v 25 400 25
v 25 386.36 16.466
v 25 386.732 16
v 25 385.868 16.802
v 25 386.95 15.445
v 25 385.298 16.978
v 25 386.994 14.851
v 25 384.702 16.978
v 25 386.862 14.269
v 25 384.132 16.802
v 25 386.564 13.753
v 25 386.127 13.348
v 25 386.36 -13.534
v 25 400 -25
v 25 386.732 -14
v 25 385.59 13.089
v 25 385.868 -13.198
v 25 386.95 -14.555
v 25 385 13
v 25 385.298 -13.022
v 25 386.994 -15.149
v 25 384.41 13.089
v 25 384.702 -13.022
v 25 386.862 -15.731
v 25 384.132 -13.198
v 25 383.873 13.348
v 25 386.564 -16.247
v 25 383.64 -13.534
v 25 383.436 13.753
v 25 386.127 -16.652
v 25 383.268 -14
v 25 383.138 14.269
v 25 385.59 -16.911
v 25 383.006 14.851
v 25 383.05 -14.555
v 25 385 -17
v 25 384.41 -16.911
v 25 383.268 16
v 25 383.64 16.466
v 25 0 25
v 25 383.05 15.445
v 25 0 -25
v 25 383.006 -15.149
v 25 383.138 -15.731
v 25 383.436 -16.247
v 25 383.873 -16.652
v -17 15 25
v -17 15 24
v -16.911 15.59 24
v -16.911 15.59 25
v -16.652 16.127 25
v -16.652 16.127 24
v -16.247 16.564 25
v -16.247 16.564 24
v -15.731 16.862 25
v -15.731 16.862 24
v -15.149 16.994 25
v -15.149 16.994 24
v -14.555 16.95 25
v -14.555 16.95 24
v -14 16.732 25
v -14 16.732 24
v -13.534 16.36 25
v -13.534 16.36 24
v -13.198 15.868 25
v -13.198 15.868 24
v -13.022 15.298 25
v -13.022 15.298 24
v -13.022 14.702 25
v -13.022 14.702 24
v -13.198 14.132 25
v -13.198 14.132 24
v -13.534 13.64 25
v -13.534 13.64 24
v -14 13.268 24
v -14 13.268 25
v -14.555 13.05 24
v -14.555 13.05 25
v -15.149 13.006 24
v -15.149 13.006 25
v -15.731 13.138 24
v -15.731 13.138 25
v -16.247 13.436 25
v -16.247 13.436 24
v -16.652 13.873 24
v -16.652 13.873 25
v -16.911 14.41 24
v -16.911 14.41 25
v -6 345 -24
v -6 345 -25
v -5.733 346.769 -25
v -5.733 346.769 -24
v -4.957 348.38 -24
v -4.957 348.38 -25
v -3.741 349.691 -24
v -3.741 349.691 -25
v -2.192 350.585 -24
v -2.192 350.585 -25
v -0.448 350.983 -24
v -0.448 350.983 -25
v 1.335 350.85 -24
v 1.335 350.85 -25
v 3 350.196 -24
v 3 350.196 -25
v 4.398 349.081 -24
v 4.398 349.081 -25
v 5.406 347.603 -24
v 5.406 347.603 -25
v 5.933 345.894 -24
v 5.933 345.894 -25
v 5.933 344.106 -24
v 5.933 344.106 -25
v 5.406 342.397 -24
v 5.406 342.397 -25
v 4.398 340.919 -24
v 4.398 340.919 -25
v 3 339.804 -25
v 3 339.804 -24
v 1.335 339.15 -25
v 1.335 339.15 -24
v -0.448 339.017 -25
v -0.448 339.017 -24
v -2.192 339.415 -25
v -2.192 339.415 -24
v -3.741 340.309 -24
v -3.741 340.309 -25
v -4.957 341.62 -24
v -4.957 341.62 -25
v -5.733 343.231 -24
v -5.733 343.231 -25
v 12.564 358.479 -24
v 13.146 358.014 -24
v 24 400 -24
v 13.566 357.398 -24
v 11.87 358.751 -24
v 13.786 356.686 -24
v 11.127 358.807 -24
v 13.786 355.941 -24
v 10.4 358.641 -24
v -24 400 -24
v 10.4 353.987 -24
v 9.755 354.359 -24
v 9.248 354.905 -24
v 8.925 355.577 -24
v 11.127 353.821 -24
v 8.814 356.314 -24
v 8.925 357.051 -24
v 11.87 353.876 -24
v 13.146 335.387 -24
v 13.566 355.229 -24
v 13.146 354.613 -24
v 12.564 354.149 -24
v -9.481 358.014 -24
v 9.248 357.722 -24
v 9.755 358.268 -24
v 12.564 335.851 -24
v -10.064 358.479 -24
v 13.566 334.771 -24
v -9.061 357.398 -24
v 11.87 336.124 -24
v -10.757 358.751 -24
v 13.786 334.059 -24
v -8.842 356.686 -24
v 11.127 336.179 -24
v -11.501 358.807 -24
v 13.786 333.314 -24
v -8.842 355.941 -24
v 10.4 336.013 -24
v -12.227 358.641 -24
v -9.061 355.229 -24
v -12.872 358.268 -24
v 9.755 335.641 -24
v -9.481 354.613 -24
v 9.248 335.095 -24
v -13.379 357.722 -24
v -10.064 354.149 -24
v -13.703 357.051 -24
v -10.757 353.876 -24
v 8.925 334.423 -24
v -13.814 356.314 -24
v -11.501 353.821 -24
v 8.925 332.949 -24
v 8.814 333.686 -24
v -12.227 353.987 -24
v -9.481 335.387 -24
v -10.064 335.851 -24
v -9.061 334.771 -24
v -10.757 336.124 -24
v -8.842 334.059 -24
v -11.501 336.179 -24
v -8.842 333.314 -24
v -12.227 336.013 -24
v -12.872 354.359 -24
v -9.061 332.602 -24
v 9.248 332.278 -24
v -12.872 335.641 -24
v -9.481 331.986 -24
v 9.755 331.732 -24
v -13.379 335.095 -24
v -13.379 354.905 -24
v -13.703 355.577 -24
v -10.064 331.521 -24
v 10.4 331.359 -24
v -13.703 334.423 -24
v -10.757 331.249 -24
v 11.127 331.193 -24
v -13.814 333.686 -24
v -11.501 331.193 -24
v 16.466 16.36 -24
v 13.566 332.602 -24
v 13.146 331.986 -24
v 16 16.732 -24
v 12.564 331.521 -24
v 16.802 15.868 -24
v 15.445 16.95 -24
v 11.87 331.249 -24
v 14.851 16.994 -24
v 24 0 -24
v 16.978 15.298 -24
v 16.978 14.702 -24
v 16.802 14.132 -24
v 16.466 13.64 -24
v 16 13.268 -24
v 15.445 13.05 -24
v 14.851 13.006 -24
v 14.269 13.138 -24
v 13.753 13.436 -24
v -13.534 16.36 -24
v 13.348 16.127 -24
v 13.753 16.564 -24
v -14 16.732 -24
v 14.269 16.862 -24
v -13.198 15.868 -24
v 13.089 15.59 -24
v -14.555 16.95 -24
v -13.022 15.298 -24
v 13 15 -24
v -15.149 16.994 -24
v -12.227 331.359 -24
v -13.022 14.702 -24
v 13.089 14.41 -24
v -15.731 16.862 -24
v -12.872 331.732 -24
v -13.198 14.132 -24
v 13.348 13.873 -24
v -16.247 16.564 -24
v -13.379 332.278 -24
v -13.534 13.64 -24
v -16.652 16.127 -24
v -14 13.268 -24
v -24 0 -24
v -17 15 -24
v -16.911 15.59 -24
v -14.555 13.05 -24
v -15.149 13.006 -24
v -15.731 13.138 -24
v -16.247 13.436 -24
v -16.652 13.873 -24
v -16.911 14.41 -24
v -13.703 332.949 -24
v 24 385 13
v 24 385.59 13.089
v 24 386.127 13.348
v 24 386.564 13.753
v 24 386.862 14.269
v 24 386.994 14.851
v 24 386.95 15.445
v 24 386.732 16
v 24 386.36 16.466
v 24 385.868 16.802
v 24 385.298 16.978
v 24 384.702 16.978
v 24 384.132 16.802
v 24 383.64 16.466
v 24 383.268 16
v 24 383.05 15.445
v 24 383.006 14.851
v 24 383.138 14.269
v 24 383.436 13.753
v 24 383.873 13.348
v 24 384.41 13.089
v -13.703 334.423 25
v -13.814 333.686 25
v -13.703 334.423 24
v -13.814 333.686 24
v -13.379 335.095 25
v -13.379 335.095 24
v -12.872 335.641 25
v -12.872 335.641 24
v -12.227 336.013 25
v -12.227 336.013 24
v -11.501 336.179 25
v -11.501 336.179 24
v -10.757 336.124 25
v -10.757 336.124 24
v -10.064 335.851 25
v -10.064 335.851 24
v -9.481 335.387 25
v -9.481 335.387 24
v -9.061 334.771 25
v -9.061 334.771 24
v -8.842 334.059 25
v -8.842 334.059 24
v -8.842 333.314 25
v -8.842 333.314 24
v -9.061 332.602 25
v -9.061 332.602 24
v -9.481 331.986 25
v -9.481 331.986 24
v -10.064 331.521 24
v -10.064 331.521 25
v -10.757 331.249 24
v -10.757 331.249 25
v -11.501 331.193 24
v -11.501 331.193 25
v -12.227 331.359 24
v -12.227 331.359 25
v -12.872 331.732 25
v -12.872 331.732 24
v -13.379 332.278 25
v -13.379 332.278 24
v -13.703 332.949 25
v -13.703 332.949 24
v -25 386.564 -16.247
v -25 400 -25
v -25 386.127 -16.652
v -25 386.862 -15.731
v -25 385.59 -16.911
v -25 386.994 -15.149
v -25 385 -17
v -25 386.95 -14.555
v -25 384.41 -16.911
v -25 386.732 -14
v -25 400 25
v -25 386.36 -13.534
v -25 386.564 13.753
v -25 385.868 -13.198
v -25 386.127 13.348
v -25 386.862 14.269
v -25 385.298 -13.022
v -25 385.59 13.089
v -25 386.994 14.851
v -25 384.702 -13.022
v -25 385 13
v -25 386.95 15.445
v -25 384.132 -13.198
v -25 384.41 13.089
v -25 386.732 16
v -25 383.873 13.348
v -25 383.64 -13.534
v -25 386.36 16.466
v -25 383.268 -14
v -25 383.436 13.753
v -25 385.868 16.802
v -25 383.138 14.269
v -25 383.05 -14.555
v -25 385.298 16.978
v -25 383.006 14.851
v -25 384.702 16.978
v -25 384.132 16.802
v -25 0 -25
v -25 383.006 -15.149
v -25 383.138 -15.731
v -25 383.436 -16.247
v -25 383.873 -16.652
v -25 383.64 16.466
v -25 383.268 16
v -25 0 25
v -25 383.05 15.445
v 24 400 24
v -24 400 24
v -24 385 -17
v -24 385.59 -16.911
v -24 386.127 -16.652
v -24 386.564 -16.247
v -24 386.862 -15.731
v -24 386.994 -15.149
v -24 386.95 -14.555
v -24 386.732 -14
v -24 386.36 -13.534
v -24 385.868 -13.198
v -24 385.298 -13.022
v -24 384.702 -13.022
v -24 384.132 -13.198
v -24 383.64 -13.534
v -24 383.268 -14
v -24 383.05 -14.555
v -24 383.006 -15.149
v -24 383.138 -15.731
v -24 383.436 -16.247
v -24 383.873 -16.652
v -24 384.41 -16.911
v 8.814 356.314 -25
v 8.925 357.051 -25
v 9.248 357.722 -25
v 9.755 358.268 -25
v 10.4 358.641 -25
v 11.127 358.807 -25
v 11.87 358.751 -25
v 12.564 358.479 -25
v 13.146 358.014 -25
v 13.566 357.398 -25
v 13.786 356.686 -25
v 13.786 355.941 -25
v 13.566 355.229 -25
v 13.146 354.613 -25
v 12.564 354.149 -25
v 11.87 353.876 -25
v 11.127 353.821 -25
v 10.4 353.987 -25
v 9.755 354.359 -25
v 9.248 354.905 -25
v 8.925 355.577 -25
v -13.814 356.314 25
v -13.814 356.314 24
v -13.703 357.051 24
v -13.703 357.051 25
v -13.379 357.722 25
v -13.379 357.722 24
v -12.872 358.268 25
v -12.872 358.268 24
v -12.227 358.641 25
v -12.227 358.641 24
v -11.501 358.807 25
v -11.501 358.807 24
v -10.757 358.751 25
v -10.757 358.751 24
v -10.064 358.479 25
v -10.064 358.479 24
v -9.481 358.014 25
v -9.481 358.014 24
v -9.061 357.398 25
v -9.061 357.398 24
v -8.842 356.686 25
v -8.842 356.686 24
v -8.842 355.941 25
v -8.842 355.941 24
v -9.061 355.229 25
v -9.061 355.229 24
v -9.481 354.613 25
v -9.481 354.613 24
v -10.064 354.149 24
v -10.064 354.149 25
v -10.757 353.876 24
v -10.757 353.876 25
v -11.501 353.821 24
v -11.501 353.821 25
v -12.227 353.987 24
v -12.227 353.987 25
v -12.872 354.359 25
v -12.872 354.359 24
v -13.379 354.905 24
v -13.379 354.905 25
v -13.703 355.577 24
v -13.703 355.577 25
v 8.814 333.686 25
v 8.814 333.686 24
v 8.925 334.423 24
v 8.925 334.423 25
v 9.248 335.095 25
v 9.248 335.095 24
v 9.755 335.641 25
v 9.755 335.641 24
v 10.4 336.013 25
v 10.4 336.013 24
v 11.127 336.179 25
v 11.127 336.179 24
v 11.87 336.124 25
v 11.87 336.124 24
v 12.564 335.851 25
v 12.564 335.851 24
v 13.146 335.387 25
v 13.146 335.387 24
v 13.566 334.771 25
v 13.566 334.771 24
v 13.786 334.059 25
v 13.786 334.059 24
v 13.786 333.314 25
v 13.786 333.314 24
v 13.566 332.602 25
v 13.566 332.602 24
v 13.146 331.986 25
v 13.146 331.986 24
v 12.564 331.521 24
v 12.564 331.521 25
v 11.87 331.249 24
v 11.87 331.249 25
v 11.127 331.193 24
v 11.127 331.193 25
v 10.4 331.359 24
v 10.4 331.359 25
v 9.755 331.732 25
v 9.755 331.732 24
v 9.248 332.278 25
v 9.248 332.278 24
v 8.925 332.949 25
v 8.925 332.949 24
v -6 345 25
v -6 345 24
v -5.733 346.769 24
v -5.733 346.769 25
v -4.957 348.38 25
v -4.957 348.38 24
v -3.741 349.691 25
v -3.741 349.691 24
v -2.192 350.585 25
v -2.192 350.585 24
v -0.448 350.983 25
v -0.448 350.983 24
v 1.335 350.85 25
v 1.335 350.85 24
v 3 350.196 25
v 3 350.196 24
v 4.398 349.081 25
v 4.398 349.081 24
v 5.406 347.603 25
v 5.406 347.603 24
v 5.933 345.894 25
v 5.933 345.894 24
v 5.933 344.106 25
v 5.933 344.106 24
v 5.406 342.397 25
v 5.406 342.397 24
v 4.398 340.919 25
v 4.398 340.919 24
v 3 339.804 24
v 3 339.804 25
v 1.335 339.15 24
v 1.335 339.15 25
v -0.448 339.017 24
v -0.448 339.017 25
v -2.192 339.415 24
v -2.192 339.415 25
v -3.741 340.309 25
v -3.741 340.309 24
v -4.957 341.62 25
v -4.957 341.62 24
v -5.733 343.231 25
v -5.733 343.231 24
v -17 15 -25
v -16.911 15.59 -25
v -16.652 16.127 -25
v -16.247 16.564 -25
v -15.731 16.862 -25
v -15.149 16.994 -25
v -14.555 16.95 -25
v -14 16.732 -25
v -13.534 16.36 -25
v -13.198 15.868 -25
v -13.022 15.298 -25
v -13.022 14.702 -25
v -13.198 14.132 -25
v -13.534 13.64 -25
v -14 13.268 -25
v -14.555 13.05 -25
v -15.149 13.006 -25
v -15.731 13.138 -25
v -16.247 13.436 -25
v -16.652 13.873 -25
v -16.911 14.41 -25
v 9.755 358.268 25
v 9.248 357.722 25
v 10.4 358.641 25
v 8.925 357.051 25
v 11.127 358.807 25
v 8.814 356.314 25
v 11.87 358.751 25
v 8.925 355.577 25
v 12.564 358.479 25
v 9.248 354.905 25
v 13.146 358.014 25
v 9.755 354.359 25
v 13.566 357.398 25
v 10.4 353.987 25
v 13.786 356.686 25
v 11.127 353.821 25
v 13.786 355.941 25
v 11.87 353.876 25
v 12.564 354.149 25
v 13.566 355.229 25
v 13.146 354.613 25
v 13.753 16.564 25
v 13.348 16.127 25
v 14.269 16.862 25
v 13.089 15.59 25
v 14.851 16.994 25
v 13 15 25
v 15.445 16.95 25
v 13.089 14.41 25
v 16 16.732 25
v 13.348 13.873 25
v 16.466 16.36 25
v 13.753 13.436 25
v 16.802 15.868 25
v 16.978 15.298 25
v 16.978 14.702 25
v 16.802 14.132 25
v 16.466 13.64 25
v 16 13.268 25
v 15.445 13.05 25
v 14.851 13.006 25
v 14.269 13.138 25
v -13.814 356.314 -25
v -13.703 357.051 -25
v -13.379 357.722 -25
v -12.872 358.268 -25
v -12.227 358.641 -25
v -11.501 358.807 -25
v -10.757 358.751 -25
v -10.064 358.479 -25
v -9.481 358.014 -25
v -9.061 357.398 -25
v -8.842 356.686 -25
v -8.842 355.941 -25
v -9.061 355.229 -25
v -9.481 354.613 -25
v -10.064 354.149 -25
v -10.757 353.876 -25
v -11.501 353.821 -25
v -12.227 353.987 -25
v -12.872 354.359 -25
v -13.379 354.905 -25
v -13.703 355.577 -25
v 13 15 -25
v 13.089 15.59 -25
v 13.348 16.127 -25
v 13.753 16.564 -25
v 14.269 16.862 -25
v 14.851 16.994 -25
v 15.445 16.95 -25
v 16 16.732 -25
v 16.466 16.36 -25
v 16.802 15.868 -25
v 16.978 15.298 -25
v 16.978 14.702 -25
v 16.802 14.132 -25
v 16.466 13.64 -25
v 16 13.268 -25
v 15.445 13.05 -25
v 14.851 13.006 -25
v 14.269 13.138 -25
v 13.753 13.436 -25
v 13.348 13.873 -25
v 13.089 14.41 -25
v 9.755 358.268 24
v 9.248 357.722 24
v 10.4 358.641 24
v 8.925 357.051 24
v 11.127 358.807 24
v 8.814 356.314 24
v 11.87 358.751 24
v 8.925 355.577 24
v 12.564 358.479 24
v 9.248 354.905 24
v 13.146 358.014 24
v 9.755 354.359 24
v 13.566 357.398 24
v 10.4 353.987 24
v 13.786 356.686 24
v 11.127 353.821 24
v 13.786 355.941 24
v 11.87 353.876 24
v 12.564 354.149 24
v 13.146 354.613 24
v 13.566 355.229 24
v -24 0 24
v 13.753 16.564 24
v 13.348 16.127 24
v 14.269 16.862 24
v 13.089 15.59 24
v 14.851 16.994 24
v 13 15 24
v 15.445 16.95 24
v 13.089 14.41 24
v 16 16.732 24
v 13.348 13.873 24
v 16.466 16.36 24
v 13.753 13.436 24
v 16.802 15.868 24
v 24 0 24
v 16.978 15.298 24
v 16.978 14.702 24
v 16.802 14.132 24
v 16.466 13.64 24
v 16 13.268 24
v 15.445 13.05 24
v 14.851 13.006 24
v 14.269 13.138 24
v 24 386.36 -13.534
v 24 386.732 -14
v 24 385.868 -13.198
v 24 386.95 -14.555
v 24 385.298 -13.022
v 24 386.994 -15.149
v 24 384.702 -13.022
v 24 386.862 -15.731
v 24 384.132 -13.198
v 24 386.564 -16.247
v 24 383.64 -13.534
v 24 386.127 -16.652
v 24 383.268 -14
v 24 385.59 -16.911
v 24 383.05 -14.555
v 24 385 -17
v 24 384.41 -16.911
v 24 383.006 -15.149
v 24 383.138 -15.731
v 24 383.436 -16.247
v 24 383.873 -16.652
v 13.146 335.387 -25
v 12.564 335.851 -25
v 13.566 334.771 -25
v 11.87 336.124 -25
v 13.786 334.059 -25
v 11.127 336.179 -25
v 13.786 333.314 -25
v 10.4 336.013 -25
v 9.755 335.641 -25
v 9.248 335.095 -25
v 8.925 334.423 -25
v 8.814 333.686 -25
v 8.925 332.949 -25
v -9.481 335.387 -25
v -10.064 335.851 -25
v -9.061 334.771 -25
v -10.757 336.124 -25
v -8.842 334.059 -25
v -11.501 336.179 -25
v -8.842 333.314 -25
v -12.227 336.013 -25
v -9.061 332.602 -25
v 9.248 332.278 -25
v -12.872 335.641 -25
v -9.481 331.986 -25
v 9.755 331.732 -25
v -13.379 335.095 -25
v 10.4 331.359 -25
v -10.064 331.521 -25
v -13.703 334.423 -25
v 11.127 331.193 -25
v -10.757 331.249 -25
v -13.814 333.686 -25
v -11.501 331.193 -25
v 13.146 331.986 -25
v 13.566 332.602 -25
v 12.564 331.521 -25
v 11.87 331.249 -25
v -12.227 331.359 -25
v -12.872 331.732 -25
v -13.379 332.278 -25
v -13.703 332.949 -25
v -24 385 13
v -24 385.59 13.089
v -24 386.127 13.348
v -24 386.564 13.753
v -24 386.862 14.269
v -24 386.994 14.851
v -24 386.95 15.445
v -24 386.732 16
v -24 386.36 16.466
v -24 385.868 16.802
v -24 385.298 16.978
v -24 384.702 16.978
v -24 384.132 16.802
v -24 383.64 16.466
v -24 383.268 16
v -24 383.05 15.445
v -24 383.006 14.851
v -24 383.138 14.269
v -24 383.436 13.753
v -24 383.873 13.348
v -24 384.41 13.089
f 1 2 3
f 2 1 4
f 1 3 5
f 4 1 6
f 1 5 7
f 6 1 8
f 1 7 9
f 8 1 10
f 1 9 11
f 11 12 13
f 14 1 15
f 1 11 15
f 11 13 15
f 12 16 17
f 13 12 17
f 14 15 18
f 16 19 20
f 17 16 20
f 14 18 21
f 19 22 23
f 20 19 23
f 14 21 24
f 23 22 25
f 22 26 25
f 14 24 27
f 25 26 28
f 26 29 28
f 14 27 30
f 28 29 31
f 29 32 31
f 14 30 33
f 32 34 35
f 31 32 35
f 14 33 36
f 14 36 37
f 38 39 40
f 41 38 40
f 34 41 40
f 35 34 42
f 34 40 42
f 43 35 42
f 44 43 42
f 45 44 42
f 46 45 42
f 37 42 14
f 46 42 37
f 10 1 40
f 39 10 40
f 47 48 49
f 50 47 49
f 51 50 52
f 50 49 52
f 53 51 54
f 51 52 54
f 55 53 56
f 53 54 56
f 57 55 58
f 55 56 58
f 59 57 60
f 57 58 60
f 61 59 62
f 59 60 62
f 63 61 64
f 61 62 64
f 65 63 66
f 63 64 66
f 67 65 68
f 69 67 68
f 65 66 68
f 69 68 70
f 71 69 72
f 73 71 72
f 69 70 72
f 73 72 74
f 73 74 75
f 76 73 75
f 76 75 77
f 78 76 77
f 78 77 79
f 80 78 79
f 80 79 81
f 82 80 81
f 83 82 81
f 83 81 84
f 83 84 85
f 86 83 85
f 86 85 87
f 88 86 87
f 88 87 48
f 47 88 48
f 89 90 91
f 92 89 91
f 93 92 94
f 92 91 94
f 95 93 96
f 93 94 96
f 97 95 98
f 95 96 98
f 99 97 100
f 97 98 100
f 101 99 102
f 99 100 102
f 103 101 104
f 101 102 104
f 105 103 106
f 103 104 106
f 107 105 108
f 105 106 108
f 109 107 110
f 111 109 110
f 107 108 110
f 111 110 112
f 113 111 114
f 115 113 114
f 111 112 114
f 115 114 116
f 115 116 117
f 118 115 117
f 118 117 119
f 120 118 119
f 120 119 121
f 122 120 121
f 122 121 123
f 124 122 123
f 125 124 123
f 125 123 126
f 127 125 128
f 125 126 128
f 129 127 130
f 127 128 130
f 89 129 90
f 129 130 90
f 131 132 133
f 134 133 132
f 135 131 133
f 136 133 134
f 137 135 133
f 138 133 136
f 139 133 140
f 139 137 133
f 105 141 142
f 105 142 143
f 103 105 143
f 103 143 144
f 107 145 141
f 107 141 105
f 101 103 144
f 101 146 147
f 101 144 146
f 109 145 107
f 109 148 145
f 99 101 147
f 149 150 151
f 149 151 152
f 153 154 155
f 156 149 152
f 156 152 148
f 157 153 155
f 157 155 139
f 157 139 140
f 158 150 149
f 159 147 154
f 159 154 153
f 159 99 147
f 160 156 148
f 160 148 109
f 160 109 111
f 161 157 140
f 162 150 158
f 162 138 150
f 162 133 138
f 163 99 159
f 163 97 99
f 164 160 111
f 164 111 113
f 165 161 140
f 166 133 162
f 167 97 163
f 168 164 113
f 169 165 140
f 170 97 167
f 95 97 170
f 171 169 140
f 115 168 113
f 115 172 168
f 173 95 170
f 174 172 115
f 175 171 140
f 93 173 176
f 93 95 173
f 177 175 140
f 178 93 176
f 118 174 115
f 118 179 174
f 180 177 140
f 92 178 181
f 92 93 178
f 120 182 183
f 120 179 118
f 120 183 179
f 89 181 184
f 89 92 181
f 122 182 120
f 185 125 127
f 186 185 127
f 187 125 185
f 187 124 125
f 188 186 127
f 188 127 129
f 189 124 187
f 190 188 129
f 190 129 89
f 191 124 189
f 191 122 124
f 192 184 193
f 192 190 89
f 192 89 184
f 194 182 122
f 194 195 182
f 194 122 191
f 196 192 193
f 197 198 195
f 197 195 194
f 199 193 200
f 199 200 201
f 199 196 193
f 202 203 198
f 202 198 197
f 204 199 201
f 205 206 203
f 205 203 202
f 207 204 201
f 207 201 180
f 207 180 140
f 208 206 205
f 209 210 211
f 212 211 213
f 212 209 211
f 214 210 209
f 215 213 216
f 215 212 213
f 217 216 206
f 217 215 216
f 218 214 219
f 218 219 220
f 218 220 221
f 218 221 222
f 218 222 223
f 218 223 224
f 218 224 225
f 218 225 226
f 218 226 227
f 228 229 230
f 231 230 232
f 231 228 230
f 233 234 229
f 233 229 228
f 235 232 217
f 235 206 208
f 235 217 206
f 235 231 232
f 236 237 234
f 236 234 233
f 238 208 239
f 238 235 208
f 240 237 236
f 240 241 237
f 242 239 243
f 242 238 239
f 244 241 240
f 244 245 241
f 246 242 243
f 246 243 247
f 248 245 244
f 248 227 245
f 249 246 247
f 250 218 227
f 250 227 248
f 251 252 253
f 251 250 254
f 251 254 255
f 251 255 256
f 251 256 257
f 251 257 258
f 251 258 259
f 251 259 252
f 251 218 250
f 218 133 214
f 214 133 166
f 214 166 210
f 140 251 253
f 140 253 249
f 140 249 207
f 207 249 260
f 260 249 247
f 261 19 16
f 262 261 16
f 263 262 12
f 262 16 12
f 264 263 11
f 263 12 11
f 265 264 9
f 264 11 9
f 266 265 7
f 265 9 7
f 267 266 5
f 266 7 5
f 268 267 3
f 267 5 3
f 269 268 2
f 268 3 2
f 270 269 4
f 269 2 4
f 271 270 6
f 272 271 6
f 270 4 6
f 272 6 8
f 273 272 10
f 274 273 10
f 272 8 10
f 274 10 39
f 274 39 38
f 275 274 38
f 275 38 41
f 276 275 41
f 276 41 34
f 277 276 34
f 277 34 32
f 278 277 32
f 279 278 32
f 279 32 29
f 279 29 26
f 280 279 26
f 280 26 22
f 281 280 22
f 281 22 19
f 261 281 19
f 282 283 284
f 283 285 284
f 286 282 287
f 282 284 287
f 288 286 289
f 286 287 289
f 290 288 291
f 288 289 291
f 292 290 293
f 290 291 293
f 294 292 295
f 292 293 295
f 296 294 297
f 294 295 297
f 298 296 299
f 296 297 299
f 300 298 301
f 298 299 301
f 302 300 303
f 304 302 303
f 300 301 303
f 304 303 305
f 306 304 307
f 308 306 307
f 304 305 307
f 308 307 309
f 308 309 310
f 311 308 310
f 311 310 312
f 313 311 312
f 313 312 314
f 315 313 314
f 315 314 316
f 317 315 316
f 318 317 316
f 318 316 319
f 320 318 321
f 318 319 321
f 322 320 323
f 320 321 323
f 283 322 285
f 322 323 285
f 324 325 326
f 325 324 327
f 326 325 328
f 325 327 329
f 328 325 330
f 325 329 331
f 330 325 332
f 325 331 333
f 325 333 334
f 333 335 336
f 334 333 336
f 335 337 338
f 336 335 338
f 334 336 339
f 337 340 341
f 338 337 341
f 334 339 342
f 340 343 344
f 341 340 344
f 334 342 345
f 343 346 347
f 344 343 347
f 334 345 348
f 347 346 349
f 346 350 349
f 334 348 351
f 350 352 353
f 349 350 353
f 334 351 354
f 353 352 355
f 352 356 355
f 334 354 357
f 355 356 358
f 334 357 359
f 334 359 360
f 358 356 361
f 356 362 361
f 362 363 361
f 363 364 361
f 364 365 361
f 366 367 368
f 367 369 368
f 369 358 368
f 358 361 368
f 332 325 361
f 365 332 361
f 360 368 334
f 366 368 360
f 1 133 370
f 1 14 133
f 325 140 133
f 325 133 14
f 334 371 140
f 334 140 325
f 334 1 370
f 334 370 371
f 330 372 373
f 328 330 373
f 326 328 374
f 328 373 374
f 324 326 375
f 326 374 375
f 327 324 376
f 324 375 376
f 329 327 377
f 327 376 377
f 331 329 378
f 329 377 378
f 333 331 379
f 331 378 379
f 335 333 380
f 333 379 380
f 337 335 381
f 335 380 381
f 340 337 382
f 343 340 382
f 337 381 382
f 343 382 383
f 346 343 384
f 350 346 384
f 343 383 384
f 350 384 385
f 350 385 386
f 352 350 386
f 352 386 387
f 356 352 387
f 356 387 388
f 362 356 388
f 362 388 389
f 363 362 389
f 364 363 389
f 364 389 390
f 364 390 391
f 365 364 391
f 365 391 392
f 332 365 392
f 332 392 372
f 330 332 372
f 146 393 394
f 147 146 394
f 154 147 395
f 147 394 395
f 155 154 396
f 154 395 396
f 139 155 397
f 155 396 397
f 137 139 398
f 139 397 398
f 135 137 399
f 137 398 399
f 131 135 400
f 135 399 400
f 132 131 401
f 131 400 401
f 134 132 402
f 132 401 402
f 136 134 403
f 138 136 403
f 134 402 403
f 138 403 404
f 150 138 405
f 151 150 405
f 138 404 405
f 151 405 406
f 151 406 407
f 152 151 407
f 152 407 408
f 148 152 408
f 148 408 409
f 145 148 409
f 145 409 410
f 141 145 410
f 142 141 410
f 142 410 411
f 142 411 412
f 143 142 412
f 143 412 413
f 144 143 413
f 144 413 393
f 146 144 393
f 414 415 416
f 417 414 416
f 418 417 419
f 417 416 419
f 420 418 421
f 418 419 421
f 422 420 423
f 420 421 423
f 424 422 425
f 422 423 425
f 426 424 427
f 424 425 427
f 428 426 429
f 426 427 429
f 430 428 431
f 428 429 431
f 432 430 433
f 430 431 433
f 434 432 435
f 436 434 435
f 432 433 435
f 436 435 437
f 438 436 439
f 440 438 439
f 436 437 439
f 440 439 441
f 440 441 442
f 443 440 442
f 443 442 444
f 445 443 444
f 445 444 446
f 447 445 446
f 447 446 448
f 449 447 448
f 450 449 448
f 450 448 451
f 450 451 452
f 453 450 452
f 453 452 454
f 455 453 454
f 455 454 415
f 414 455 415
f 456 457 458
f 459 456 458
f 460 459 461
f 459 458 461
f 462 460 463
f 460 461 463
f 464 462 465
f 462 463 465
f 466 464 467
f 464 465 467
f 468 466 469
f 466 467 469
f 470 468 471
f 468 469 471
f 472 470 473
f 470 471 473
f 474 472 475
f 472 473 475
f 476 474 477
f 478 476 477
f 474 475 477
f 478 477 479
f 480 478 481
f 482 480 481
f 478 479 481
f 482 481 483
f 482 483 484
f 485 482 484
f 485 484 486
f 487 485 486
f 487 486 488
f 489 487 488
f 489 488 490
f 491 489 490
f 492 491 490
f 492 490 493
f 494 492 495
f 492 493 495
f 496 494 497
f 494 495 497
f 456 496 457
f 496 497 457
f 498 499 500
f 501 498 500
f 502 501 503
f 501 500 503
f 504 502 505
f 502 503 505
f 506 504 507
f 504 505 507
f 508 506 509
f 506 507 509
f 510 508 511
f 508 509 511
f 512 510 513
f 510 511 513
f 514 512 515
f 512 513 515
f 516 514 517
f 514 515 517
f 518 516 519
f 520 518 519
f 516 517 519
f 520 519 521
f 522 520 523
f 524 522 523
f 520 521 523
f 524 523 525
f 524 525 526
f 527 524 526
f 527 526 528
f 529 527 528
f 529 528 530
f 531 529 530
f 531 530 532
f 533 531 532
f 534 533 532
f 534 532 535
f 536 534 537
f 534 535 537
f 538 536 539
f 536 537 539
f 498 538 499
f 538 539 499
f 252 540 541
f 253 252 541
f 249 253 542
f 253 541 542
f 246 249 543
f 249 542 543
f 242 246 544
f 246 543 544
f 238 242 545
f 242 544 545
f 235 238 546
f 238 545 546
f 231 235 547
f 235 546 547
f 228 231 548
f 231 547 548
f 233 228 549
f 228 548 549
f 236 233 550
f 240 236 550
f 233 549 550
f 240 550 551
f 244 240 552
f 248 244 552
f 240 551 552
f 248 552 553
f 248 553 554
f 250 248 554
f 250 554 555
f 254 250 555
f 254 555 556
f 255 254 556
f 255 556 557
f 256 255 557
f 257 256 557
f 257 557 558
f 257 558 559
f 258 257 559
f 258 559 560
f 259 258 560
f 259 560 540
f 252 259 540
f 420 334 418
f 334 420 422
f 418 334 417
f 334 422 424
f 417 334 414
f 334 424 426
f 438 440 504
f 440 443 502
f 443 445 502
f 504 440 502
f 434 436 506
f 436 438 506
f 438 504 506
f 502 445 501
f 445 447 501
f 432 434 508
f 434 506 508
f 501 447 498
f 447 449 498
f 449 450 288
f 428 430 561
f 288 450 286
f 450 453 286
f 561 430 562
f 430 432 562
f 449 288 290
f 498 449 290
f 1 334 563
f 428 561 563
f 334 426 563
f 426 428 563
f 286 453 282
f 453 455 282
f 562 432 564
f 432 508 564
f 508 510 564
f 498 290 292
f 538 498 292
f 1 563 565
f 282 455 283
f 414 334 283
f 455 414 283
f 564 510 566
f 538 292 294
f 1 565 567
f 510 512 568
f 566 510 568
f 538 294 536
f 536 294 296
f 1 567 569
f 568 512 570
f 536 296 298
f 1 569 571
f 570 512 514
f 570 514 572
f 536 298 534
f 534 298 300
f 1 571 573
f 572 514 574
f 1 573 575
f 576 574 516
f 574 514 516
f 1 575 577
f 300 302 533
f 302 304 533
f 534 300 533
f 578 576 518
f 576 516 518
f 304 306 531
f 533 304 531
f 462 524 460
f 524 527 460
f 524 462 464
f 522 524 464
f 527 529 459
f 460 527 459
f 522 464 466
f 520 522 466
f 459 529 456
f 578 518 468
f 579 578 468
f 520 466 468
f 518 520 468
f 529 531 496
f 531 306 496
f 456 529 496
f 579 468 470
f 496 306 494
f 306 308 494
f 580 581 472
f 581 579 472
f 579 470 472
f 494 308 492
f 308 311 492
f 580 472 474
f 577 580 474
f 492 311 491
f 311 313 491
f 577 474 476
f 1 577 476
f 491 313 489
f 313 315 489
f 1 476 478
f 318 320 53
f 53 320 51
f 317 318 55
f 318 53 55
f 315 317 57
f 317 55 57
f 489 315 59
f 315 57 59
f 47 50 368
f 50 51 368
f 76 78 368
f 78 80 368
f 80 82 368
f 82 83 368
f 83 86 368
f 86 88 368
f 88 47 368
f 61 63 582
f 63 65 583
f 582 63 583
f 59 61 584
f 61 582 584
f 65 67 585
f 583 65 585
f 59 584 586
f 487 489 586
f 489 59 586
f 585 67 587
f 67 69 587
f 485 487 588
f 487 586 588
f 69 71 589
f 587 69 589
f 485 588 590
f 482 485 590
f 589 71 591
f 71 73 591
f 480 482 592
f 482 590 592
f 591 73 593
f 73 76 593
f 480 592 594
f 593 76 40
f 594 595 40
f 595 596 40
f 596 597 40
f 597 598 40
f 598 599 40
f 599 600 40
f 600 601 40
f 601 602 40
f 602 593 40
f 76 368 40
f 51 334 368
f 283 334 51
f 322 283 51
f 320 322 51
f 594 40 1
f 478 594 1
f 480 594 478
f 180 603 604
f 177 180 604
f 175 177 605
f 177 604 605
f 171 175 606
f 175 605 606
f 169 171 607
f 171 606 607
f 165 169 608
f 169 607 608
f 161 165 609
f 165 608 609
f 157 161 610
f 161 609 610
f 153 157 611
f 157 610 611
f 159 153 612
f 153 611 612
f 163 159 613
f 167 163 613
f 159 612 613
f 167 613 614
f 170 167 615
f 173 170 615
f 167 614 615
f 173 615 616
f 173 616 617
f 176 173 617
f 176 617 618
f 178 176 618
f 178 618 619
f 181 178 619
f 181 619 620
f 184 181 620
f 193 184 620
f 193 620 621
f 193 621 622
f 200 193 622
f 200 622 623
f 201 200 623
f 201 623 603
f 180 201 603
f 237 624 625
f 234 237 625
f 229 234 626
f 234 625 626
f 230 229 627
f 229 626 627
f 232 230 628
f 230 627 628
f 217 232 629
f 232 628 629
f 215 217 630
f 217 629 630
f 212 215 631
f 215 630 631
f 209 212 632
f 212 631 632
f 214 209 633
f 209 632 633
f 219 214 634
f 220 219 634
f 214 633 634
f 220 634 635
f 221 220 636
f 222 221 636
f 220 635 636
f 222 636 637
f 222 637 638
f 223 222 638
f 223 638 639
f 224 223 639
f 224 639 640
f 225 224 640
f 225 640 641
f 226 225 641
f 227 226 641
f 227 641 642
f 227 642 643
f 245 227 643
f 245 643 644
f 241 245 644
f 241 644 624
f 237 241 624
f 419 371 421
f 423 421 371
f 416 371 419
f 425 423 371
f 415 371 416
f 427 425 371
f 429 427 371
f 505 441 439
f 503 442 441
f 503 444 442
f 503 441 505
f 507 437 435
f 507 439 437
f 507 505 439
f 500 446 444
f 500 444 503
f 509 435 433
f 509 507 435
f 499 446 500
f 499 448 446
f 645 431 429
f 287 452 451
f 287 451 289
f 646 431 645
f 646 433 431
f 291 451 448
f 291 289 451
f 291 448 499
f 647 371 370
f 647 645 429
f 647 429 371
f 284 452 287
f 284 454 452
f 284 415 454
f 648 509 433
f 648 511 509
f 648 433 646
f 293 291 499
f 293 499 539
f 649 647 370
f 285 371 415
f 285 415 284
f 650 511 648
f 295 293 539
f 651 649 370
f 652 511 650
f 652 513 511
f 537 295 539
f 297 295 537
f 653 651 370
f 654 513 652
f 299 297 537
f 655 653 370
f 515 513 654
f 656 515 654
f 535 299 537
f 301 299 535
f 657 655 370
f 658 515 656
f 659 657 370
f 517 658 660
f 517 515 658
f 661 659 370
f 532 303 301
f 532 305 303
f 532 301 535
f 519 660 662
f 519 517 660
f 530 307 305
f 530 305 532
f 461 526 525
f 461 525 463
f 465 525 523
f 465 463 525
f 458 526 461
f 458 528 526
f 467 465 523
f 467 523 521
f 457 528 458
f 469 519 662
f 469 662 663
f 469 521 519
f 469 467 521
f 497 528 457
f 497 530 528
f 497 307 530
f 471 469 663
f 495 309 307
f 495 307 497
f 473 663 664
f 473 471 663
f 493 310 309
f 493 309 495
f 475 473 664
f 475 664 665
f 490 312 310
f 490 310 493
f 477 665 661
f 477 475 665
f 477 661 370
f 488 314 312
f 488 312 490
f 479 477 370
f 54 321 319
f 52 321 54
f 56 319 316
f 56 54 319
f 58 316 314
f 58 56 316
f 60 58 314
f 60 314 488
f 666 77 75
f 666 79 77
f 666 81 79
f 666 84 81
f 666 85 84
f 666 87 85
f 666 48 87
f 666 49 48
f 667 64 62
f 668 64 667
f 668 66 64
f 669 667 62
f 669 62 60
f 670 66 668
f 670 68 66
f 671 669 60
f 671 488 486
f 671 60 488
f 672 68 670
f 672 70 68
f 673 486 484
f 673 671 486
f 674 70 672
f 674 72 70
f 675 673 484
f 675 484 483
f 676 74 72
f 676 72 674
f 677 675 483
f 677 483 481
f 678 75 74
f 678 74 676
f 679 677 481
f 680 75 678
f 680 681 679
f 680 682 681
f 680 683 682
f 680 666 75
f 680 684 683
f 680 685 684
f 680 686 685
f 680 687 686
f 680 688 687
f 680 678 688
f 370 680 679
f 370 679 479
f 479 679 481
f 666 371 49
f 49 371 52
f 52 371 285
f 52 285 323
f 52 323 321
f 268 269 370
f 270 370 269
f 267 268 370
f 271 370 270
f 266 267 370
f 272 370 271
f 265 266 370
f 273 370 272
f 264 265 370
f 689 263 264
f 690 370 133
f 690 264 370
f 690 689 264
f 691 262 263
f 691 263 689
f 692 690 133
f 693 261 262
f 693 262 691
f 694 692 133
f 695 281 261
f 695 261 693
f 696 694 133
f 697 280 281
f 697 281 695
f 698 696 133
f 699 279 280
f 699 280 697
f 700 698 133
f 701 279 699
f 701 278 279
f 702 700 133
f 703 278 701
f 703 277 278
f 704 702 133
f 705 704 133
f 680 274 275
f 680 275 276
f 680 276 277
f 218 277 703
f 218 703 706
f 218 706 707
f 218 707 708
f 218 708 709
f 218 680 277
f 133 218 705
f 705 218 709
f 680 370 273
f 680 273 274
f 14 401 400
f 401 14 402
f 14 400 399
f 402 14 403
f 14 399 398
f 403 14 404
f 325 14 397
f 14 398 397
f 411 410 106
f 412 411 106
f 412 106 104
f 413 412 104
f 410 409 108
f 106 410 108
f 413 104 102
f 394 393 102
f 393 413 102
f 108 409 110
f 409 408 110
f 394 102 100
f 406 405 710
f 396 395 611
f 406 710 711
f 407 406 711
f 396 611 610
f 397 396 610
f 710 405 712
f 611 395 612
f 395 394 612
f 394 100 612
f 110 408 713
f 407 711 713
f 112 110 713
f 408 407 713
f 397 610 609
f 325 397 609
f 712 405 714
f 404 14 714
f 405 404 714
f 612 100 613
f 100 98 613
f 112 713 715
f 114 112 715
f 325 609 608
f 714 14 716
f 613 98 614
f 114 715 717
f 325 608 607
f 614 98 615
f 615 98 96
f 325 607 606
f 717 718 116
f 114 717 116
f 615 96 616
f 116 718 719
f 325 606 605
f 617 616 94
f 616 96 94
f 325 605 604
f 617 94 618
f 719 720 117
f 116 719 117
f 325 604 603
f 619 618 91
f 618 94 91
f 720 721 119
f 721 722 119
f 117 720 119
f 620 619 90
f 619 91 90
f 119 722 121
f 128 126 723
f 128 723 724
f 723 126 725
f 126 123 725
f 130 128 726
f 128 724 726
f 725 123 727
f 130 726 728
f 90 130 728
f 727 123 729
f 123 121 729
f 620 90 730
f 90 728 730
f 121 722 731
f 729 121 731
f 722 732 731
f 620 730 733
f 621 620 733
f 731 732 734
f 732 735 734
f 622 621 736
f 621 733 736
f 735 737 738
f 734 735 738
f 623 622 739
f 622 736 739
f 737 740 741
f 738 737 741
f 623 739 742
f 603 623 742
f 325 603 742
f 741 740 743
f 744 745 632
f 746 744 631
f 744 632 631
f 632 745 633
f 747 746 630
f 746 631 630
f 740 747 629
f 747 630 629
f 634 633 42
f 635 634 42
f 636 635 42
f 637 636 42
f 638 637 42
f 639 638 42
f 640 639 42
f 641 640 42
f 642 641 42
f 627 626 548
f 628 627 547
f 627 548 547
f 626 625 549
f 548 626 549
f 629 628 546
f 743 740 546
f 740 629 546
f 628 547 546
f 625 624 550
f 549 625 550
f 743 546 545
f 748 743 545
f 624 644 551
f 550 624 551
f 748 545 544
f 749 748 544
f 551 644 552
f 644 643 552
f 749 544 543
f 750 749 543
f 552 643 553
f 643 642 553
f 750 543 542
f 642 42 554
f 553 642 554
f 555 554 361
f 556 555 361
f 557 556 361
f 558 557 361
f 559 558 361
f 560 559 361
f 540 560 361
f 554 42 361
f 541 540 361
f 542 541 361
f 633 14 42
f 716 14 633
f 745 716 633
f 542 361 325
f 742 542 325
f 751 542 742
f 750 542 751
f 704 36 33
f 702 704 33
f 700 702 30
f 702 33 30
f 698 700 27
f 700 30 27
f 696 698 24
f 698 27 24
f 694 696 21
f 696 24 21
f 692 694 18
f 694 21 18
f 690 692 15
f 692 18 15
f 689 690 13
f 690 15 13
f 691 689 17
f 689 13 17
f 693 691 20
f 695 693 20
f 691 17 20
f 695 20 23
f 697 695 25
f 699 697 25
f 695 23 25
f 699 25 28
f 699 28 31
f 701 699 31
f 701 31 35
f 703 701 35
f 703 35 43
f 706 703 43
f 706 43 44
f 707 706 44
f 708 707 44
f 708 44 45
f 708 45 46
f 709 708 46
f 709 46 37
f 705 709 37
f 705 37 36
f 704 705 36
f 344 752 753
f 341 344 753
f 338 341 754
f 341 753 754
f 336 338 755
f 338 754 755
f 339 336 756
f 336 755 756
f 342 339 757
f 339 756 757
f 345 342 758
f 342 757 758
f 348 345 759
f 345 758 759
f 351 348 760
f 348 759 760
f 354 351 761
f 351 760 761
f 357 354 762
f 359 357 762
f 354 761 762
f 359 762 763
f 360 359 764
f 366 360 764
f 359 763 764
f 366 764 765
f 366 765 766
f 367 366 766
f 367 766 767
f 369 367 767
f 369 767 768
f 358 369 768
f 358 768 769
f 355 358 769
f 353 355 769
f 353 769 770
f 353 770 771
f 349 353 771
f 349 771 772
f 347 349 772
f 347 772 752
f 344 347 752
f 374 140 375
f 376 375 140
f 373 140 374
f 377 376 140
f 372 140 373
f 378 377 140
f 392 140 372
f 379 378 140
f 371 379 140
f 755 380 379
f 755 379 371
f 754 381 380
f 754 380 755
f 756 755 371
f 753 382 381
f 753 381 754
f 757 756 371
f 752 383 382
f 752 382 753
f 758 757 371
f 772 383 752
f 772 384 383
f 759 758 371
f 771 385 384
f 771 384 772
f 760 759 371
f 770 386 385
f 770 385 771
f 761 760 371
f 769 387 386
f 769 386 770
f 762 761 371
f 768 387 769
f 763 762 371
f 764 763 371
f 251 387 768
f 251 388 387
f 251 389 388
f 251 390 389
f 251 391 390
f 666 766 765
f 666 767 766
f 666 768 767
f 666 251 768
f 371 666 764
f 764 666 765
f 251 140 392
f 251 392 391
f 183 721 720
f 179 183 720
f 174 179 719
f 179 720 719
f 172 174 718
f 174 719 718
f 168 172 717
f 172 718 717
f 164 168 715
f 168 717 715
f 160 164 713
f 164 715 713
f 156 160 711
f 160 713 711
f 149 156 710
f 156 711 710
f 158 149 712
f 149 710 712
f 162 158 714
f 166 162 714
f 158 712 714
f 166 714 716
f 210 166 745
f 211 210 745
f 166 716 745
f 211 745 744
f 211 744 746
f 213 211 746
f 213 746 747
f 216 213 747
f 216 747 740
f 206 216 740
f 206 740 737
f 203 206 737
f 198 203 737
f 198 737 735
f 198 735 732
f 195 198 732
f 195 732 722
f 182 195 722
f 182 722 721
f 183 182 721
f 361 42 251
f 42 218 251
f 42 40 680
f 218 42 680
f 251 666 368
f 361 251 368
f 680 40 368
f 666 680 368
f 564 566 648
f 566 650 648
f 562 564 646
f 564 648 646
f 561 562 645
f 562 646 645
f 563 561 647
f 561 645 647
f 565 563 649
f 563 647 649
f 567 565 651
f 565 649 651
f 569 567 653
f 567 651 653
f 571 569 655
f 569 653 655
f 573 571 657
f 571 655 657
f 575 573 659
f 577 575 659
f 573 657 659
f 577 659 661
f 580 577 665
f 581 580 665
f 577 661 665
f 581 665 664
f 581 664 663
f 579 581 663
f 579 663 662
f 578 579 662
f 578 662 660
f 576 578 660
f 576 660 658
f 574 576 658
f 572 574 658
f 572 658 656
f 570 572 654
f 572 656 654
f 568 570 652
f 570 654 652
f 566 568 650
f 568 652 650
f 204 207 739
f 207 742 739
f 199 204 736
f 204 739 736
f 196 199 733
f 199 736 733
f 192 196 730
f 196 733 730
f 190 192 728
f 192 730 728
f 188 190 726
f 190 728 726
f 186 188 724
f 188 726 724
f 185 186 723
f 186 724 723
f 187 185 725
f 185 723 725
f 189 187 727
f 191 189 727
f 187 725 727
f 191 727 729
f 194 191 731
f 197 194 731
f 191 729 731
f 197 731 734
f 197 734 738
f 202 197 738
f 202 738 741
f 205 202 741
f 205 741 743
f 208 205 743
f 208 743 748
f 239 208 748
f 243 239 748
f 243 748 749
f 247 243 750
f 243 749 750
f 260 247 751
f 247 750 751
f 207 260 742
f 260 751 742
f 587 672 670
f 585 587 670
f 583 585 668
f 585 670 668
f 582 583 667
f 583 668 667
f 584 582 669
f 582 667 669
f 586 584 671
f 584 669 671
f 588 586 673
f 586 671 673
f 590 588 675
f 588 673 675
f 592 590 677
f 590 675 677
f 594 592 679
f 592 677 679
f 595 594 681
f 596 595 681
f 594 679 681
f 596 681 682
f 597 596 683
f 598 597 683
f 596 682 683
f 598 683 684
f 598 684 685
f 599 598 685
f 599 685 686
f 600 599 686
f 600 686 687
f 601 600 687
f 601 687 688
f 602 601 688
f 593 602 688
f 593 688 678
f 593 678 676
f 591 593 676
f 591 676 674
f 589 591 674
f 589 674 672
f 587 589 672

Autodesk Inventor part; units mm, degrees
ref_plane "YZ Plane" through (0, 0, 0) normal (1, 0, 0) x (0, 1, 0)
ref_plane "XZ Plane" through (0, 0, 0) normal (0, 1, 0) x (-1, 0, 0)
ref_plane "XY Plane" through (0, 0, 0) normal (0, 0, 1) x (1, 0, 0)
sketch "Sketch1" plane through (0, 0, 0) normal (0, 1, 0) x (-1, 0, 0)
  line L0 (25, 25) -> (-25, 25)
  line L1 (-25, 25) -> (-25, -25)
  line L2 (-25, -25) -> (25, -25)
  line L3 (25, -25) -> (25, 25)
  line L4 (25, 25) -> (-25, -25) construction
  line L5 (-25, 25) -> (25, -25) construction
  line L6 (24, 24) -> (-24, 24)
  line L7 (-24, 24) -> (-24, -24)
  line L8 (-24, -24) -> (24, -24)
  line L9 (24, -24) -> (24, 24)
  line L10 (24, 24) -> (-24, -24) construction
  line L11 (-24, 24) -> (24, -24) construction
  point P0 (0, 0)
  dimension "d0" = 50
  dimension "d2" = 48
extrude "Extrusion1" add sketch "Sketch1" along normal blind 400
sketch "Sketch3" plane through (25, 0, -25) normal (0, 0, -1) x (-1, 0, 0)
  line L0 (50, 0) -> (50, 400) projected
  line L1 (0, 0) -> (0, 400) projected
  line L2 (50, 0) -> (50, 400) projected
  line L3 (0, 400) -> (50, 400)
  line L4 (50, 400) -> (50, 370)
  line L5 (50, 370) -> (0, 370)
  line L6 (0, 370) -> (0, 400)
  line L7 (0, 400) -> (50, 370) construction
  line L8 (25, 385) -> (40, 385) construction
  line L9 (25, 385) -> (10, 385) construction
  line L10 (0, 30) -> (50, 30)
  line L11 (50, 30) -> (50, 0)
  line L12 (50, 0) -> (0, 0)
  line L13 (0, 0) -> (0, 30)
  line L14 (0, 30) -> (50, 0) construction
  circle A0 centre (40, 15) radius 2
  line L15 (25, 15) -> (40, 15) construction
  line L16 (25, 15) -> (10, 15) construction
  circle A1 centre (10, 15) radius 2
  line L17 (25, 385) -> (25, 345) construction
  circle A2 centre (25, 345) radius 6
  line L18 (25, 345) -> (36.3137, 333.6863) construction
  line L19 (0, 0) -> (16, 0) construction
  line L20 (25, 345) -> (13.6863, 356.3137) construction
  circle A3 centre (36.3137, 333.6863) radius 2.5
  circle A4 centre (13.6863, 356.3137) radius 2.5
  circle A5 centre (36.3137, 356.3137) radius 2.5
  circle A6 centre (13.6863, 333.6863) radius 2.5
  dimension "d28" = 30
  dimension "d30" = 15
  dimension "d31" = 15
  dimension "d33" = 30
  dimension "d34" = 4
  dimension "d35" = 15
  dimension "d36" = 15
  dimension "d37" = 4
  dimension "d38" = 40
  dimension "d61" = 12
  dimension "d64" = 16
  dimension "d65" = 5
extrude "Extrusion3" cut sketch "Sketch3" against normal blind 50 contours A0 | A1 | A2 | A3 | A4 | A5 | A6
sketch "Sketch5" plane through (25, 0, 25) normal (1, 0, 0) x (0, 0, -1)
  line L0 (0, 400) -> (50, 400)
  line L1 (50, 400) -> (50, 370)
  line L2 (50, 370) -> (0, 370)
  line L3 (0, 370) -> (0, 400)
  line L4 (0, 400) -> (50, 370) construction
  circle A0 centre (40, 385) radius 2
  line L5 (25, 385) -> (40, 385) construction
  line L6 (25, 385) -> (10, 385) construction
  circle A1 centre (10, 385) radius 2
  point P0 (25, 0)
  dimension "d40" = 30
  dimension "d41" = 4
  dimension "d42" = 15
  dimension "d43" = 15
  dimension "d44" = 4
extrude "Extrusion5" cut sketch "Sketch5" against normal blind 50 contours A0 | A1
properties part number "End-Link" material "Aluminum 6061"
